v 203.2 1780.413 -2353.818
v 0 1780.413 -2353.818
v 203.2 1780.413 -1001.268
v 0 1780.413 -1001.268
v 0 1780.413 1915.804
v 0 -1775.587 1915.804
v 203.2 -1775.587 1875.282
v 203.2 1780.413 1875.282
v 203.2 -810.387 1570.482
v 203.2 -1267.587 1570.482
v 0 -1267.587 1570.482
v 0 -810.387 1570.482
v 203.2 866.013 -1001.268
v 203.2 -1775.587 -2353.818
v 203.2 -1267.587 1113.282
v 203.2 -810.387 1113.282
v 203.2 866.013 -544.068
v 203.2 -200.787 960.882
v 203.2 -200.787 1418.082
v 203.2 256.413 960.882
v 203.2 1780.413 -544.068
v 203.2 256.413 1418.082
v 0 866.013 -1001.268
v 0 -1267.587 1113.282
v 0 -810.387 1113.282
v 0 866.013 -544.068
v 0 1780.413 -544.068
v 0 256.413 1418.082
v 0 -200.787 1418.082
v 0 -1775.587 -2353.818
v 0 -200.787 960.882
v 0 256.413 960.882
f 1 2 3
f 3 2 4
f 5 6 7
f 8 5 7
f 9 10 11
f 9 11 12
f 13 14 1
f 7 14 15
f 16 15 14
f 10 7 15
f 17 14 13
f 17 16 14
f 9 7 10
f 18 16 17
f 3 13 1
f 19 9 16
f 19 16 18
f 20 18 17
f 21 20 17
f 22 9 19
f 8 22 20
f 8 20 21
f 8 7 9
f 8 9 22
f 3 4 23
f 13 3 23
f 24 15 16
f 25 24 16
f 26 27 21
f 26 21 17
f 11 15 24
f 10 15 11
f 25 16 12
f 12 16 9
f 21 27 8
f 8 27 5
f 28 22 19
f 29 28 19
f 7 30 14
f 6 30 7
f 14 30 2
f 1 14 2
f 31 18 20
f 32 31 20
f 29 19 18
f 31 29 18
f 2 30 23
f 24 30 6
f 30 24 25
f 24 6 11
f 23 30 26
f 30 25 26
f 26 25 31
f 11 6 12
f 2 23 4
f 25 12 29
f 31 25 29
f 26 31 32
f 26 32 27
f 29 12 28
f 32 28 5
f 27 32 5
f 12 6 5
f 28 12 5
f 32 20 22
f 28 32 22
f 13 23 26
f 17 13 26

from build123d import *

# Parameters (mm, degrees)
F0_W     = 3556
F0_H     = 4707.636
F1_DEPTH = 203.2
F3_DEPTH = 3556
F4_W     = 914.4
F4_H     = 457.2
F5_DEPTH = 203.2
F6_W     = 457.2
F6_H     = 457.2
F7_DEPTH = 203.2
F9_DEPTH = 203.2


with BuildPart() as f1:
    # F0 (on Right) → F1 (new body)
    with BuildSketch(Plane.YZ):
        with Locations((2.413105, 0)):
            Rectangle(F0_W, F0_H)
    extrude(amount=F1_DEPTH)

    # F2 (on face) → F3 (cut)
    with BuildSketch(Plane.XZ.offset(1775.586895)):
        Polygon((0, 1915.80375), (203.2, 1875.282), (203.2, 2353.818), (0, 2353.818), align=None)
    extrude(amount=-F3_DEPTH, mode=Mode.SUBTRACT)

    # F4 (on face) → F5 (cut)
    with BuildSketch(Plane(origin=(0, 0, 0), x_dir=(0, -1, 0), z_dir=(-1, 0, 0))):
        with Locations((-1323.213105, -772.668)):
            Rectangle(F4_W, F4_H)
    extrude(amount=-F5_DEPTH, mode=Mode.SUBTRACT)

    # F6 (on face) → F7 (cut)
    with BuildSketch(Plane.YZ.offset(203.2)):
        with Locations((-1038.986895, 1341.882)):
            Rectangle(F6_W, F6_H)
    extrude(amount=-F7_DEPTH, mode=Mode.SUBTRACT)

    # F8 (on face) → F9 (cut)
    with BuildSketch(Plane.YZ.offset(203.2)):
        Polygon((-200.786895, 1418.082), (-200.786895, 1113.282), (-200.786895, 960.882), (256.413105, 960.882), (256.413105, 1418.082), align=None)
    extrude(amount=-F9_DEPTH, mode=Mode.SUBTRACT)


solid = f1.part
